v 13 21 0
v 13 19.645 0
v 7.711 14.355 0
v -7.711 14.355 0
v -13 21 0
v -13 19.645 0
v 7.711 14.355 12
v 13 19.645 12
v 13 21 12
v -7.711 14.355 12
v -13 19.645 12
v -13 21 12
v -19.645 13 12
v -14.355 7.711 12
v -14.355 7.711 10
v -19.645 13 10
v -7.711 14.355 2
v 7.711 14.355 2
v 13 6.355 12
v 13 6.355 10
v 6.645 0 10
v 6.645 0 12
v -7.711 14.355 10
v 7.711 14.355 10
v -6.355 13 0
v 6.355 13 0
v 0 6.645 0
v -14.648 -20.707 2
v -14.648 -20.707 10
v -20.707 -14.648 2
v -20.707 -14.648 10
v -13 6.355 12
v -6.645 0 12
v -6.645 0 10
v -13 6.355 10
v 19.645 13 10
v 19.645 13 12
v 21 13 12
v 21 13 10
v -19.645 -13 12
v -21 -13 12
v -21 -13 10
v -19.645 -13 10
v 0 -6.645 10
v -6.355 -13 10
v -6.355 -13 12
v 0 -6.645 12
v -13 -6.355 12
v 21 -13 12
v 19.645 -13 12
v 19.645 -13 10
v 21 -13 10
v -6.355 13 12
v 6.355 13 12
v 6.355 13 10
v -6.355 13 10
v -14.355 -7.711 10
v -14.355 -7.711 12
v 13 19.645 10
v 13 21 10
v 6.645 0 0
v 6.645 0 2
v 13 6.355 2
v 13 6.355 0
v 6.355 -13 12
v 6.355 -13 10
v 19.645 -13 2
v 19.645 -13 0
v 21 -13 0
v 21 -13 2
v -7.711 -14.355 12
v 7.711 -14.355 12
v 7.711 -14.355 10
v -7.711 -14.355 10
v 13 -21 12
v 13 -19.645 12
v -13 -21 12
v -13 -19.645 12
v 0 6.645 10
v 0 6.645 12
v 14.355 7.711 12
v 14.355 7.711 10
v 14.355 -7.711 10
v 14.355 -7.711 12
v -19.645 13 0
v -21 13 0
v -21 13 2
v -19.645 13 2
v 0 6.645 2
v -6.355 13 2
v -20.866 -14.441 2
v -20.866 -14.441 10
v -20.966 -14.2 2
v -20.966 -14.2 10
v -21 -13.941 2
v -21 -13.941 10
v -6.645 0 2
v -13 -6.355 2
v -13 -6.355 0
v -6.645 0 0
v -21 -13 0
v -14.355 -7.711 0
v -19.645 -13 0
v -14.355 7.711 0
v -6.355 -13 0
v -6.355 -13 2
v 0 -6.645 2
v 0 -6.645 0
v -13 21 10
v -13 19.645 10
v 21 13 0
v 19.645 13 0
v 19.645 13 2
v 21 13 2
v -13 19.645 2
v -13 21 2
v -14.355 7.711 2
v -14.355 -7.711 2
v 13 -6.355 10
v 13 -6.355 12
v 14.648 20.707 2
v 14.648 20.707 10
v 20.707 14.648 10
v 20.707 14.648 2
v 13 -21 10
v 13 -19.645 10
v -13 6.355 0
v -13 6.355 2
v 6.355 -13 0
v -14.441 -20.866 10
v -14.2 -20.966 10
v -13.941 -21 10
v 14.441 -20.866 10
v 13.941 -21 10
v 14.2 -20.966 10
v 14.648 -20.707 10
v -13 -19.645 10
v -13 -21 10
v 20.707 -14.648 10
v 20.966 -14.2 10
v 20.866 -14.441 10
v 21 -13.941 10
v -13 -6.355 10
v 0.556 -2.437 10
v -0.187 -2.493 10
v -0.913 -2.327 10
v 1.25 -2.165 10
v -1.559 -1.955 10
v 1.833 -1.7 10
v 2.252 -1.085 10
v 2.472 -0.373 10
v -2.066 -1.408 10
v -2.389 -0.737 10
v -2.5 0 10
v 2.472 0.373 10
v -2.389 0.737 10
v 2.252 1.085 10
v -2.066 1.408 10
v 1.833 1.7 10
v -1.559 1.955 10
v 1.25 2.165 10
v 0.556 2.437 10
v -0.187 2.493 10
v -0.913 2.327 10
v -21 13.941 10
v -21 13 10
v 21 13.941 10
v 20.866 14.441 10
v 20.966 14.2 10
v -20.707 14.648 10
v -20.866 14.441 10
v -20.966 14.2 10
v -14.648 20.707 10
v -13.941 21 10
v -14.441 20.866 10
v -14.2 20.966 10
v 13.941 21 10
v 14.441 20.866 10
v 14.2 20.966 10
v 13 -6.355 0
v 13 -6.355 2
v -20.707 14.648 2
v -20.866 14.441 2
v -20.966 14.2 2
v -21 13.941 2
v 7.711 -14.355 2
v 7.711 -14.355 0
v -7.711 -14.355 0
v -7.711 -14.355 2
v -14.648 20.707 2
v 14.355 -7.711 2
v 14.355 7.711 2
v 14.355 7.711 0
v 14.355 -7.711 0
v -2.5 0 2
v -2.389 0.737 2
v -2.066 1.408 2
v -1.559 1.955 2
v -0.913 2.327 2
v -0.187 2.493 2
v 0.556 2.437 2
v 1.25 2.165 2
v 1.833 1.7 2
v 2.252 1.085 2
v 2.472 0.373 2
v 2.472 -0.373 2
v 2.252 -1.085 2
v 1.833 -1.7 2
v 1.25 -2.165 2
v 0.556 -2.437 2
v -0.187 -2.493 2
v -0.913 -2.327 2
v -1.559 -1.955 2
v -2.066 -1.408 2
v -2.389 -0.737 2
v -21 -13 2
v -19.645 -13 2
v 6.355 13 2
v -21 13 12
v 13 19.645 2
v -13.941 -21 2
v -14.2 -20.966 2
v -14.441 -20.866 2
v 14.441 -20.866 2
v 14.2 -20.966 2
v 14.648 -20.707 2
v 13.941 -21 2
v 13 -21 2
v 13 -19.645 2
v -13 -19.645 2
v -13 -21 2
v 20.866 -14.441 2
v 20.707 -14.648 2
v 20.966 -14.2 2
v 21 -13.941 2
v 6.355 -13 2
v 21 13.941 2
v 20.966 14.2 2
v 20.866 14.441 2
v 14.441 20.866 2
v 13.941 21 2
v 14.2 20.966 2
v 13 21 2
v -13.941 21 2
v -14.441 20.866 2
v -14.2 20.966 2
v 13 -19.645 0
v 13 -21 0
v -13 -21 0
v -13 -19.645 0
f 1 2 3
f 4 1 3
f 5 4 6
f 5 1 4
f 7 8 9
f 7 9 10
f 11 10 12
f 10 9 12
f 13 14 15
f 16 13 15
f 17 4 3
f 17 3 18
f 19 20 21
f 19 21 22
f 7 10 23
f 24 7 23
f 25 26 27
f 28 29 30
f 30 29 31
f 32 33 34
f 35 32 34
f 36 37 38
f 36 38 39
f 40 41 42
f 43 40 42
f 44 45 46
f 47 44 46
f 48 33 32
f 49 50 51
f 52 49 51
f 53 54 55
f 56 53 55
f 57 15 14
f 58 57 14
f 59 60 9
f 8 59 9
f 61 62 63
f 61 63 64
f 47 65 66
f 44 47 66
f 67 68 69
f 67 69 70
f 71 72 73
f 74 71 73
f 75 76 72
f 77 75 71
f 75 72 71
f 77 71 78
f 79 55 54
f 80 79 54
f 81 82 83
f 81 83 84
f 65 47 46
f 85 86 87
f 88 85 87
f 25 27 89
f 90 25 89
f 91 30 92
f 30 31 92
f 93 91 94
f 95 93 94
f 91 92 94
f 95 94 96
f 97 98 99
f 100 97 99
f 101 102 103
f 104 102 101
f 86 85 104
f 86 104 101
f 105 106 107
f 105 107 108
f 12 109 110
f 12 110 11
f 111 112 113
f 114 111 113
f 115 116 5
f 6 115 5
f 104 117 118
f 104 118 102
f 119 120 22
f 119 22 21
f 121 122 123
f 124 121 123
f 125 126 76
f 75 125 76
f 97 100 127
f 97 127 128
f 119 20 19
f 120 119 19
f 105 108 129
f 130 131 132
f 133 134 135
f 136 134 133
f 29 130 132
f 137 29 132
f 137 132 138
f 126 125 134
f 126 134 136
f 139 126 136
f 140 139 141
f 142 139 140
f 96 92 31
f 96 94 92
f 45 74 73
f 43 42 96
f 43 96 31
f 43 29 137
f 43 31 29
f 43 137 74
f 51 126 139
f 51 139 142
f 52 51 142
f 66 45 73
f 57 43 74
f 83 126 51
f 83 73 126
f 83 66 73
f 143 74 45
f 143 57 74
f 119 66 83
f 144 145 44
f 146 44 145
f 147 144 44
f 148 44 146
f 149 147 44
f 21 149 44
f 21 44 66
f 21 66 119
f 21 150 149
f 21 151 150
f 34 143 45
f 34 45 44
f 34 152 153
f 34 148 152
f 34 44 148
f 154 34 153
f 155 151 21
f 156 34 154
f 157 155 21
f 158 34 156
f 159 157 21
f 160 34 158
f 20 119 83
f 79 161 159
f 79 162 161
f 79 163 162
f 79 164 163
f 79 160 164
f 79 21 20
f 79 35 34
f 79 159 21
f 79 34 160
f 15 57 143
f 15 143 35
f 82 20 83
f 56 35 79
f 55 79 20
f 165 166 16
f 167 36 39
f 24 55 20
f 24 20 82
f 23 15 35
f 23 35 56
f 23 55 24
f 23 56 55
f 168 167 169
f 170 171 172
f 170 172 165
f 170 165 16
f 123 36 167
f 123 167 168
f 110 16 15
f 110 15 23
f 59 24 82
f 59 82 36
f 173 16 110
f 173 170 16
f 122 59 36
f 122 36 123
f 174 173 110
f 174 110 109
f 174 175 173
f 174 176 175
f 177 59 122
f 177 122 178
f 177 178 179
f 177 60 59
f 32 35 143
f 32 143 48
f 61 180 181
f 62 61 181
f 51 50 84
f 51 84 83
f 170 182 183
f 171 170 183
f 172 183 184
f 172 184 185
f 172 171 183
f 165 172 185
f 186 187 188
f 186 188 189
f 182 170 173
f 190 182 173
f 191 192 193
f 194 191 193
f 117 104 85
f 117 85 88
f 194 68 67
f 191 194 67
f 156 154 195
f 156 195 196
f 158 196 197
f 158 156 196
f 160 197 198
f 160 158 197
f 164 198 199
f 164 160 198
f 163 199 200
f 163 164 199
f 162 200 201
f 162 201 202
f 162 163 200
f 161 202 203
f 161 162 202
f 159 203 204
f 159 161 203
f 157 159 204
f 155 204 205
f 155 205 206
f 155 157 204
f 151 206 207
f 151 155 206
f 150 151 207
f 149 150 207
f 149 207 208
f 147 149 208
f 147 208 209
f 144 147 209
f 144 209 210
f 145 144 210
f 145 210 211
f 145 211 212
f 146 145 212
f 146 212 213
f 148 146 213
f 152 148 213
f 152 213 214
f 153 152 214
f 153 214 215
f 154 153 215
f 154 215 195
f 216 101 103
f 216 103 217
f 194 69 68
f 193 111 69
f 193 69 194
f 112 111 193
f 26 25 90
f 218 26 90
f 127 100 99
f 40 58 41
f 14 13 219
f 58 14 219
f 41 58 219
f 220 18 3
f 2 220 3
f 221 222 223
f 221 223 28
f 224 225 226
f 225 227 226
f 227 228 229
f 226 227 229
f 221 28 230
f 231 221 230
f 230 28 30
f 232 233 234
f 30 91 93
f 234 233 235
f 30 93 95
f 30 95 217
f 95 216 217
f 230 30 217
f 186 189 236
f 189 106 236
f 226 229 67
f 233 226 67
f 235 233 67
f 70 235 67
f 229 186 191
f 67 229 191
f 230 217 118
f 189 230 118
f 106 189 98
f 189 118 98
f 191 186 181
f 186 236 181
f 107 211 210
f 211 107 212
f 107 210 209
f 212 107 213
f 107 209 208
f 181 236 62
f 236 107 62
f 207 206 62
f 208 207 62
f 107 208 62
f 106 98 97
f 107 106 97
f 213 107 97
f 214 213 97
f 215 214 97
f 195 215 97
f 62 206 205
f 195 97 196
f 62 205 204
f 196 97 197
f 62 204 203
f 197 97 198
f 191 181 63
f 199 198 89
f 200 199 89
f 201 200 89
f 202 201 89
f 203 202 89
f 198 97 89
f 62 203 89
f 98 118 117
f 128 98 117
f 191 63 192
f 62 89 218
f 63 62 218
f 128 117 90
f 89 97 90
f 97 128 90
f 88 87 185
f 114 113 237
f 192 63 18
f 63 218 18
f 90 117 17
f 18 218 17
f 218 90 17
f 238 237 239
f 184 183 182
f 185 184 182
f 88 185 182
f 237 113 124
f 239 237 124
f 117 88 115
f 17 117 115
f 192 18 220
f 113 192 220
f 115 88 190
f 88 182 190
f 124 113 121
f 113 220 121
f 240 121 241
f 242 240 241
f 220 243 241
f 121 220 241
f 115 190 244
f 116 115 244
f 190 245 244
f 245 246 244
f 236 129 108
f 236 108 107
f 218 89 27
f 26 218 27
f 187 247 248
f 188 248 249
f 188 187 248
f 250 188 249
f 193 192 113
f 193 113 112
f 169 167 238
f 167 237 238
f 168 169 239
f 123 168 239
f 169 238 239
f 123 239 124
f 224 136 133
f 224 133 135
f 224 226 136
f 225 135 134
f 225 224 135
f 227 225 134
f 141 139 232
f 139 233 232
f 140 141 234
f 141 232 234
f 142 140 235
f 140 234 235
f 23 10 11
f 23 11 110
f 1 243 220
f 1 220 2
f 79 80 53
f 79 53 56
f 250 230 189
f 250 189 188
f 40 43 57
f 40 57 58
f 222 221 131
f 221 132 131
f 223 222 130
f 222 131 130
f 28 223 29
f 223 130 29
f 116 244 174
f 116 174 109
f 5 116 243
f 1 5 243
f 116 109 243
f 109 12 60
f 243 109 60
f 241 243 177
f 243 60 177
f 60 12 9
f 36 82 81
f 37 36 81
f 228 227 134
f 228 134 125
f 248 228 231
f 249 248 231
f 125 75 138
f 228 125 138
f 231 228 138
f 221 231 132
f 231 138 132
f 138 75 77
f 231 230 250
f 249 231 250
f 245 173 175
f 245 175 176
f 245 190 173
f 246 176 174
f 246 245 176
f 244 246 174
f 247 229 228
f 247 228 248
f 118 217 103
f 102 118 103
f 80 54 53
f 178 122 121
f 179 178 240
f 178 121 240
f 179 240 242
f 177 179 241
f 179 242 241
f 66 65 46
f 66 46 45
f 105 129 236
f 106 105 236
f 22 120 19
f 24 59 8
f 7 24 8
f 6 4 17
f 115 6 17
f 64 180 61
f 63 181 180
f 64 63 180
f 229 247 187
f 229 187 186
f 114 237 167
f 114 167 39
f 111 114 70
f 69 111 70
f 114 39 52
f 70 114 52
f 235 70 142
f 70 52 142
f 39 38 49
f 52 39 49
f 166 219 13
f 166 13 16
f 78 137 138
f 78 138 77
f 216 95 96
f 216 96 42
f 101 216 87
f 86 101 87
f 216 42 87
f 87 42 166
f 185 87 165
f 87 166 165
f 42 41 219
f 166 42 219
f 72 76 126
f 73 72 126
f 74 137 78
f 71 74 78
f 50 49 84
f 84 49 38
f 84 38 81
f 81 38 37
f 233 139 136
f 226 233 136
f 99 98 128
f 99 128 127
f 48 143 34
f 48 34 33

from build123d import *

# Parameters (mm, degrees)
BOSS_EXTRUDE1_DEPTH = 6
SKETCH2_W           = 1.355339059
SKETCH2_H           = 2
CUT_EXTRUDE1_DEPTH  = 43
SKETCH3_W           = 2
SKETCH3_H           = 1.355339059
CUT_EXTRUDE2_DEPTH  = 43
SKETCH4_W           = 2
SKETCH4_H           = 9.39696962
CUT_EXTRUDE3_DEPTH  = 55.69848481
SKETCH5_W           = 2
SKETCH5_H           = 9.39696962
CUT_EXTRUDE4_DEPTH  = 55.69848481
SKETCH7_R           = 2.5
CUT_EXTRUDE7_DEPTH  = 7
FILLET1_R           = 1


with BuildPart() as part:
    # Sketch1 → Boss-Extrude1 (new body)
    with BuildSketch(Plane.XY):
        Polygon((-21, 14.355339059), (-14.355339059, 21), (14.355339059, 21), (21, 14.355339059), (21, -14.355339059), (14.355339059, -21), (-14.355339059, -21), (-21, -14.355339059), align=None)
    boss_extrude1 = extrude(amount=BOSS_EXTRUDE1_DEPTH)

    # Sketch2 → Cut-Extrude1 (cut, through all)
    with BuildSketch(Plane(origin=(0, 21, 0), x_dir=(1, 0, 0), z_dir=(0, 1, 0))):
        with Locations((-13.67766953, -1)):
            Rectangle(SKETCH2_W, SKETCH2_H)
        with Locations((13.67766953, -1)):
            Rectangle(SKETCH2_W, SKETCH2_H)
    cut_extrude1 = extrude(amount=-CUT_EXTRUDE1_DEPTH, mode=Mode.SUBTRACT)

    # Sketch3 → Cut-Extrude2 (cut, through all)
    with BuildSketch(Plane.ZY.offset(21)):
        with Locations((1, 13.67766953)):
            Rectangle(SKETCH3_W, SKETCH3_H)
        with Locations((1, -13.67766953)):
            Rectangle(SKETCH3_W, SKETCH3_H)
    cut_extrude2 = extrude(amount=-CUT_EXTRUDE2_DEPTH, mode=Mode.SUBTRACT)

    # Sketch4 → Cut-Extrude3 (cut, through all)
    with BuildSketch(Plane(origin=(17.67766953, 17.67766953, 0), x_dir=(0, 0, -1), z_dir=(0.707106781, 0.707106781, 0))):
        with Locations((-1, 0)):
            Rectangle(SKETCH4_W, SKETCH4_H)
    cut_extrude3 = extrude(amount=-CUT_EXTRUDE3_DEPTH, mode=Mode.SUBTRACT)

    # Sketch5 → Cut-Extrude4 (cut, through all)
    with BuildSketch(Plane(origin=(-17.67766953, 17.67766953, 0), x_dir=(0, 0, 1), z_dir=(-0.707106781, 0.707106781, 0))):
        with Locations((1, 0)):
            Rectangle(SKETCH5_W, SKETCH5_H)
    cut_extrude4 = extrude(amount=-CUT_EXTRUDE4_DEPTH, mode=Mode.SUBTRACT)

    # Sketch7 → Cut-Extrude7 (cut, through all)
    with BuildSketch(Plane(origin=(0, 0, 0), x_dir=(-1, 0, 0), z_dir=(0, 0, -1))):
        Circle(SKETCH7_R)
    cut_extrude7 = extrude(amount=-CUT_EXTRUDE7_DEPTH, mode=Mode.SUBTRACT)

    # Mirror2: Boss-Extrude1, Cut-Extrude1, Cut-Extrude2, Cut-Extrude3, Cut-Extrude4, Cut-Extrude7 across plane
    add(boss_extrude1.mirror(Plane(origin=(0, 0, 6), x_dir=(1, 0, 0), z_dir=(0, 0, -1))))
    add(cut_extrude1.mirror(Plane(origin=(0, 0, 6), x_dir=(1, 0, 0), z_dir=(0, 0, -1))), mode=Mode.SUBTRACT)
    add(cut_extrude2.mirror(Plane(origin=(0, 0, 6), x_dir=(1, 0, 0), z_dir=(0, 0, -1))), mode=Mode.SUBTRACT)
    add(cut_extrude3.mirror(Plane(origin=(0, 0, 6), x_dir=(1, 0, 0), z_dir=(0, 0, -1))), mode=Mode.SUBTRACT)
    add(cut_extrude4.mirror(Plane(origin=(0, 0, 6), x_dir=(1, 0, 0), z_dir=(0, 0, -1))), mode=Mode.SUBTRACT)
    add(cut_extrude7.mirror(Plane(origin=(0, 0, 6), x_dir=(1, 0, 0), z_dir=(0, 0, -1))), mode=Mode.SUBTRACT)

    # Fillet1
    fillet1_edges = [part.edges().sort_by_distance(p)[0] for p in [
        (-14.355339059, 21, 6),
        (-14.355339059, -21, 6),
        (14.355339059, 21, 6),
        (14.355339059, -21, 6),
        (-21, 14.355339059, 6),
        (21, 14.355339059, 6),
        (21, -14.355339059, 6),
        (-21, -14.355339059, 6),
    ]]
    fillet(fillet1_edges, radius=FILLET1_R)


solid = part.part
